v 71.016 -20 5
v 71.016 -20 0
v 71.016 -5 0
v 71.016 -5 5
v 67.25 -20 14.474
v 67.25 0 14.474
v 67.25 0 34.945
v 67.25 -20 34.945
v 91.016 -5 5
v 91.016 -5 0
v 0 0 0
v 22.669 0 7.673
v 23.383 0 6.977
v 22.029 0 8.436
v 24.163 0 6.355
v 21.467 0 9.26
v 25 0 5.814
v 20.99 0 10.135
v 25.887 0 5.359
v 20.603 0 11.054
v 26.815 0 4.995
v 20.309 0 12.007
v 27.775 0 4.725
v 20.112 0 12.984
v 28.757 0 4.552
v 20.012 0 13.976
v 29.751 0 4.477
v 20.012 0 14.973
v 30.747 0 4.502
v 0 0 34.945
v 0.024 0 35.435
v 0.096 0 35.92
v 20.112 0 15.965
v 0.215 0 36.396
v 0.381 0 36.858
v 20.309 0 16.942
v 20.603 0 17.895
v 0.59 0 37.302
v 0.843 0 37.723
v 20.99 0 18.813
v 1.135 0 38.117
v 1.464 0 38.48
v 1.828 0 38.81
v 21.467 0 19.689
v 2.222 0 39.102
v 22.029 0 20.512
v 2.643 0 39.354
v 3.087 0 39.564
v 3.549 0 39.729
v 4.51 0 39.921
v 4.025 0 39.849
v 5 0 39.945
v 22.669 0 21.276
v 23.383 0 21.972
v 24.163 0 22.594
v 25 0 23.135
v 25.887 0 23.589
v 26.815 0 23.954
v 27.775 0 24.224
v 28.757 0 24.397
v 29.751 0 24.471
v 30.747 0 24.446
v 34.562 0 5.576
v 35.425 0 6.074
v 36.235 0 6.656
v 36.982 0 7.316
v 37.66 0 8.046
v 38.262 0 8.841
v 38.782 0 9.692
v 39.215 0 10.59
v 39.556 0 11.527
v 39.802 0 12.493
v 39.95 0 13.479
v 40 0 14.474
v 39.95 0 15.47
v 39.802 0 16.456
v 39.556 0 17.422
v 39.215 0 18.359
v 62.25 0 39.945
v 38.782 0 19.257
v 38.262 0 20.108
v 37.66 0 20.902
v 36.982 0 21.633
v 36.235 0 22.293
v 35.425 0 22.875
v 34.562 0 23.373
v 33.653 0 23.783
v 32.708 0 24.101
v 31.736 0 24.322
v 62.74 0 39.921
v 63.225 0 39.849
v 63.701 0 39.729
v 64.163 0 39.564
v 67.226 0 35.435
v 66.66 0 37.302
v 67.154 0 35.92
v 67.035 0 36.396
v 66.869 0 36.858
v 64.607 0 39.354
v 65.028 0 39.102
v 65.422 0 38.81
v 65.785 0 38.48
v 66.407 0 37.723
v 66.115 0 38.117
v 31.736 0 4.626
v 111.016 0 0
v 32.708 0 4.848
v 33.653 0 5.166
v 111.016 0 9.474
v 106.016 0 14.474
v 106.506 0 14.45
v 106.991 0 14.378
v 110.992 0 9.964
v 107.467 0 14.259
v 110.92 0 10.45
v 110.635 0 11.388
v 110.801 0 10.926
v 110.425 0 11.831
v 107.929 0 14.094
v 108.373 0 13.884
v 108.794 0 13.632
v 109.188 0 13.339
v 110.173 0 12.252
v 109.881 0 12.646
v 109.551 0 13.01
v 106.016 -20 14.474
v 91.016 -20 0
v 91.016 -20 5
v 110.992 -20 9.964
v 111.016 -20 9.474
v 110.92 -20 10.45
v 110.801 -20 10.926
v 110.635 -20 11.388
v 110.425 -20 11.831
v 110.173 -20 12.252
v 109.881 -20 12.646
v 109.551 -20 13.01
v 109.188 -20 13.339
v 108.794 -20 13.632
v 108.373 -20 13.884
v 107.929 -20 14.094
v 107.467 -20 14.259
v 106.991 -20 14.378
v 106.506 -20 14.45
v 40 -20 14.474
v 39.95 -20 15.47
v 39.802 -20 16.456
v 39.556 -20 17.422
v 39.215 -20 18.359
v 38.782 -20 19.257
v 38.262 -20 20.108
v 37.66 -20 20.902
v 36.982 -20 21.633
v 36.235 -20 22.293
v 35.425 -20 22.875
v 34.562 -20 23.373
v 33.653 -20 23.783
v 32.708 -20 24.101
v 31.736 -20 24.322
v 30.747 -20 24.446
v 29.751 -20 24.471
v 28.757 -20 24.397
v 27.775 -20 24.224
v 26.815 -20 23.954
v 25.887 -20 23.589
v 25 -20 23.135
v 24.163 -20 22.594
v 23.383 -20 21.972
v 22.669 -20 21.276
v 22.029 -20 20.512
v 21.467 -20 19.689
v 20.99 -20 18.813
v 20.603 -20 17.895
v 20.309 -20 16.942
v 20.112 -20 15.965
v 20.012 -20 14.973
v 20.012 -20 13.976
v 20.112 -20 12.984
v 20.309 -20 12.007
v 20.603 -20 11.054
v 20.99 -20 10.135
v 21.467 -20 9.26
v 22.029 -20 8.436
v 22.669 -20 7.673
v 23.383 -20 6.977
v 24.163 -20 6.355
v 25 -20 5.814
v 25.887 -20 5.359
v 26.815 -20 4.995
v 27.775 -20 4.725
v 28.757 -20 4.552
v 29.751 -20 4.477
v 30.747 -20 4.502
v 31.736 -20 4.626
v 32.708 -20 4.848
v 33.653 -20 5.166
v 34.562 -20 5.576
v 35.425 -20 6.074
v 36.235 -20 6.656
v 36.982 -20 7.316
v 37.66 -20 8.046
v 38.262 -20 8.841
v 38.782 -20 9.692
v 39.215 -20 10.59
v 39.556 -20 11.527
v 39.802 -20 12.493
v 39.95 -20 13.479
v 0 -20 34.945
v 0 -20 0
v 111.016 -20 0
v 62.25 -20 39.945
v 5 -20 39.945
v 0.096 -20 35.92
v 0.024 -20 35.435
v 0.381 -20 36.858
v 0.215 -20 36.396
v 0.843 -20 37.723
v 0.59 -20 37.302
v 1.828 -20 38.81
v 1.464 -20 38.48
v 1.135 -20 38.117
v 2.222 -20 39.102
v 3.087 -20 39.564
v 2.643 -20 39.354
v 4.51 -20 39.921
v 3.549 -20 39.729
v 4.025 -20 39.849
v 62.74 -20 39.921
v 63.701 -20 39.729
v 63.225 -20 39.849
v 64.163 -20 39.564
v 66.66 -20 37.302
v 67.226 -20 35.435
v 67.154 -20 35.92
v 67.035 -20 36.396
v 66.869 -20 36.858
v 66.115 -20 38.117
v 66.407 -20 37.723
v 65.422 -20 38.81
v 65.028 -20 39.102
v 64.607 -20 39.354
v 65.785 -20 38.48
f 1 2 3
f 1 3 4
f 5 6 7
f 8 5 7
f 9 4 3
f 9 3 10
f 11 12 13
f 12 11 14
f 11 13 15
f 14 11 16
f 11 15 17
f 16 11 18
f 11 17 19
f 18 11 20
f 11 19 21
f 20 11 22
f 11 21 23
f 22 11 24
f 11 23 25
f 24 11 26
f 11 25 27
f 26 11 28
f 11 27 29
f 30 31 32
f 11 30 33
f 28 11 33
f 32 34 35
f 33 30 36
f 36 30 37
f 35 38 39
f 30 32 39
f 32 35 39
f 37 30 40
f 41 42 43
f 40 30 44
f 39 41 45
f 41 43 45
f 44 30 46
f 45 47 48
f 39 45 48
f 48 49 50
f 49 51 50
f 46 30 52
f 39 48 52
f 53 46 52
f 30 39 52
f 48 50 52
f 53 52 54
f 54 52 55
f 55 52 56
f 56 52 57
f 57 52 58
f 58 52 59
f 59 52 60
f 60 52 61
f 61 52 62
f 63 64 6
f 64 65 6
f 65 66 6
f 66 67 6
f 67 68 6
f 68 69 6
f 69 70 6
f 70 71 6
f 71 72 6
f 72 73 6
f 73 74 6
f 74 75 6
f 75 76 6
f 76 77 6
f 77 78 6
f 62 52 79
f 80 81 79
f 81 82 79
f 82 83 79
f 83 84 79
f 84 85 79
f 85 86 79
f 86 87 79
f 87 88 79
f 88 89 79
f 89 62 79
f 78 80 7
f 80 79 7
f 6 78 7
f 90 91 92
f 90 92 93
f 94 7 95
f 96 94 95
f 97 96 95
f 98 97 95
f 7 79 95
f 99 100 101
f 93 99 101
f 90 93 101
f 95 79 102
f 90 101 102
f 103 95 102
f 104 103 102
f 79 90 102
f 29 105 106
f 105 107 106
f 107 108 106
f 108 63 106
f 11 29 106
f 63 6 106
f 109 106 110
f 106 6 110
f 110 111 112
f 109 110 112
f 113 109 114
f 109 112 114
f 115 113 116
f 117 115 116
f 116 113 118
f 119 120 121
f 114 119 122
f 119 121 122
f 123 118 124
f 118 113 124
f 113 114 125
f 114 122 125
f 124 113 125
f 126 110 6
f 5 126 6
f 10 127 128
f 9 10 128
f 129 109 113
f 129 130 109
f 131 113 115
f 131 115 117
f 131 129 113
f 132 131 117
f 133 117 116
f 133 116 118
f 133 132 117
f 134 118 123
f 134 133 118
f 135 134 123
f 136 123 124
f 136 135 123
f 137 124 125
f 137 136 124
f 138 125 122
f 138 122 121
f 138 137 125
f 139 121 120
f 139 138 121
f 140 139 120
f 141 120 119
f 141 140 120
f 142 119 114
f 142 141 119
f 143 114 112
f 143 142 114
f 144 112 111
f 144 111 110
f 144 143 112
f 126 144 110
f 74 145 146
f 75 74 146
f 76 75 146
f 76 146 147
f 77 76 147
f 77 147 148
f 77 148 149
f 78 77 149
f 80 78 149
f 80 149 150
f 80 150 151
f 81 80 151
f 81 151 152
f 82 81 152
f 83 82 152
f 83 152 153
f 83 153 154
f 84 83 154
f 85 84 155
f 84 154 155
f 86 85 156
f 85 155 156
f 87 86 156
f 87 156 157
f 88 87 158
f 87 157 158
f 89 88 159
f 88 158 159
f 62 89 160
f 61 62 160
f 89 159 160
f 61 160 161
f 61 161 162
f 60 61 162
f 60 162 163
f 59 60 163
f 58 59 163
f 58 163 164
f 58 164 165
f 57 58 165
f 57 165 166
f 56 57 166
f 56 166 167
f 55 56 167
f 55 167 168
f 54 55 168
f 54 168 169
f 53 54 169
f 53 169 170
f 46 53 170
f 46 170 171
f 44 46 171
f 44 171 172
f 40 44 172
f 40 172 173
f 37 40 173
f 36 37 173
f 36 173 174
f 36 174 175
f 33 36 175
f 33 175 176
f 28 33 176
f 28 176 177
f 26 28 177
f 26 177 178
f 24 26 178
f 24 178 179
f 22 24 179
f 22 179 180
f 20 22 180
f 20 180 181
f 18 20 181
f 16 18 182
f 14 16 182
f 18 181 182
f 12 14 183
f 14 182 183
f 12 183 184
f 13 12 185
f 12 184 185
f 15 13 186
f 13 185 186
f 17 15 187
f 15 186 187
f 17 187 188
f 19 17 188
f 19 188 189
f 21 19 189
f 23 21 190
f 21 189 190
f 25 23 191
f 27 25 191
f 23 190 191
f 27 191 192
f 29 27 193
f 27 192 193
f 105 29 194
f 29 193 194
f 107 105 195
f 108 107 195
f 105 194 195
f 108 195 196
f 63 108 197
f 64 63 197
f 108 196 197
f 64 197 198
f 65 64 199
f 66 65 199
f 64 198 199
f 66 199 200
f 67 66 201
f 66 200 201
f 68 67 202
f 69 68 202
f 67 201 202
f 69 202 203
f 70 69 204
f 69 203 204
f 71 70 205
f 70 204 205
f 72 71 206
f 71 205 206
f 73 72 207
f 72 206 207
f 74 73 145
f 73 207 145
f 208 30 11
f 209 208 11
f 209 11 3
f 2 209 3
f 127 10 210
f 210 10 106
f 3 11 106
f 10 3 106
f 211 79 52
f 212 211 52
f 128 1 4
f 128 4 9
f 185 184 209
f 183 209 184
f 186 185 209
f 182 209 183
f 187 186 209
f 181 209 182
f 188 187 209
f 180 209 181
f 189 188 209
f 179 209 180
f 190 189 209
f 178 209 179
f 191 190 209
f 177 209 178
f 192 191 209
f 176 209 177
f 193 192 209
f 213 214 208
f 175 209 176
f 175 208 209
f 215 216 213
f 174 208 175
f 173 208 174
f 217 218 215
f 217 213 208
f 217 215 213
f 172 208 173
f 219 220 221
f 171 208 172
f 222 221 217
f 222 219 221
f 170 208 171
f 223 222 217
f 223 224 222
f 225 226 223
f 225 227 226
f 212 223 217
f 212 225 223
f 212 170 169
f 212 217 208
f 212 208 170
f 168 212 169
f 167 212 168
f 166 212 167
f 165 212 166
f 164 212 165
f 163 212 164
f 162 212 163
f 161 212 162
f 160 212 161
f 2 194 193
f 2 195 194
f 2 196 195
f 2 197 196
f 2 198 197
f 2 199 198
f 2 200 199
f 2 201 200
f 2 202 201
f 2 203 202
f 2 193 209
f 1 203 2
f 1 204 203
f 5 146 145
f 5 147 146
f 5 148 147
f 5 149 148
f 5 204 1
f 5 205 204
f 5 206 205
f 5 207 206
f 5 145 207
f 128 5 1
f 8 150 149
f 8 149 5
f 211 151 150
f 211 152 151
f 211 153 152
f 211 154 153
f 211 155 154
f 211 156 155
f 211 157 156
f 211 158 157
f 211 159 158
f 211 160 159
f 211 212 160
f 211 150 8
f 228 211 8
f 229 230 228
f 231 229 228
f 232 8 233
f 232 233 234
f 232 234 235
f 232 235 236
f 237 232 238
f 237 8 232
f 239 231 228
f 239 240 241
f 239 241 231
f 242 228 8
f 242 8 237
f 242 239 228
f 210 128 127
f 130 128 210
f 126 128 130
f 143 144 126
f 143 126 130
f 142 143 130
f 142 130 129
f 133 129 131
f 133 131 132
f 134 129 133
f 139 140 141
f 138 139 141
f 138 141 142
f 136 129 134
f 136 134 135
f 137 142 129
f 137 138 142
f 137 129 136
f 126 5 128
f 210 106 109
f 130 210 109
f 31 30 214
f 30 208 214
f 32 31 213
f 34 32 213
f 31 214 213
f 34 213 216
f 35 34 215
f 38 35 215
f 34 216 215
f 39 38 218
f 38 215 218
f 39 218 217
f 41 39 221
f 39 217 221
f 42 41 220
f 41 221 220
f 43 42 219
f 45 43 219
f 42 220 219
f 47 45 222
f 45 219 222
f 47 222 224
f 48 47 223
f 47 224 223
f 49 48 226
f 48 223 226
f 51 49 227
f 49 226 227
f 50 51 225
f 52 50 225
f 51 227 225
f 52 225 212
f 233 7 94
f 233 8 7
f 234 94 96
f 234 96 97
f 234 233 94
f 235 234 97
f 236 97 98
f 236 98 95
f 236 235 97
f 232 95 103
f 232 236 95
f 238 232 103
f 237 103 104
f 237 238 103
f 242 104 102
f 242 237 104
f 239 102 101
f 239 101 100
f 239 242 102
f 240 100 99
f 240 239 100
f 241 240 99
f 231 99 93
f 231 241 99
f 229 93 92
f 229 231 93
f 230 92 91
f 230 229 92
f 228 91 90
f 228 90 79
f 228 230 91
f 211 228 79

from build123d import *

# Parameters (mm, degrees)
F1_DEPTH = 20
F2_R     = 5
F3_R     = 10
F4_DEPTH = 20.001
F5_W     = 20
F5_H     = 5
F6_DEPTH = 15


with BuildPart() as f1:
    # F0 (on Front) → F1 (new body)
    with BuildSketch(Plane.XZ):
        Polygon((0, 39.944667), (0, 0), (111.015879, 0), (111.015879, 14.474314), (67.249916, 14.474314), (67.249916, 39.944667), align=None)
    extrude(amount=F1_DEPTH)

    # F2
    f2_edges = [f1.edges().sort_by_distance(p)[0] for p in [
        (67.249916, -10, 39.944667),
        (111.015879, -10, 14.474314),
        (0, -10, 39.944667),
    ]]
    fillet(f2_edges, radius=F2_R)

    # F3 (on face) → F4 (cut, through all)
    with BuildSketch(Plane.XZ.offset(20)):
        with Locations((30, 14.474314)):
            Circle(F3_R)
    extrude(amount=-F4_DEPTH, mode=Mode.SUBTRACT)

    # F5 (on face) → F6 (cut)
    with BuildSketch(Plane.XZ.offset(20)):
        with Locations((81.015879, 2.5)):
            Rectangle(F5_W, F5_H)
    extrude(amount=-F6_DEPTH, mode=Mode.SUBTRACT)


solid = f1.part
